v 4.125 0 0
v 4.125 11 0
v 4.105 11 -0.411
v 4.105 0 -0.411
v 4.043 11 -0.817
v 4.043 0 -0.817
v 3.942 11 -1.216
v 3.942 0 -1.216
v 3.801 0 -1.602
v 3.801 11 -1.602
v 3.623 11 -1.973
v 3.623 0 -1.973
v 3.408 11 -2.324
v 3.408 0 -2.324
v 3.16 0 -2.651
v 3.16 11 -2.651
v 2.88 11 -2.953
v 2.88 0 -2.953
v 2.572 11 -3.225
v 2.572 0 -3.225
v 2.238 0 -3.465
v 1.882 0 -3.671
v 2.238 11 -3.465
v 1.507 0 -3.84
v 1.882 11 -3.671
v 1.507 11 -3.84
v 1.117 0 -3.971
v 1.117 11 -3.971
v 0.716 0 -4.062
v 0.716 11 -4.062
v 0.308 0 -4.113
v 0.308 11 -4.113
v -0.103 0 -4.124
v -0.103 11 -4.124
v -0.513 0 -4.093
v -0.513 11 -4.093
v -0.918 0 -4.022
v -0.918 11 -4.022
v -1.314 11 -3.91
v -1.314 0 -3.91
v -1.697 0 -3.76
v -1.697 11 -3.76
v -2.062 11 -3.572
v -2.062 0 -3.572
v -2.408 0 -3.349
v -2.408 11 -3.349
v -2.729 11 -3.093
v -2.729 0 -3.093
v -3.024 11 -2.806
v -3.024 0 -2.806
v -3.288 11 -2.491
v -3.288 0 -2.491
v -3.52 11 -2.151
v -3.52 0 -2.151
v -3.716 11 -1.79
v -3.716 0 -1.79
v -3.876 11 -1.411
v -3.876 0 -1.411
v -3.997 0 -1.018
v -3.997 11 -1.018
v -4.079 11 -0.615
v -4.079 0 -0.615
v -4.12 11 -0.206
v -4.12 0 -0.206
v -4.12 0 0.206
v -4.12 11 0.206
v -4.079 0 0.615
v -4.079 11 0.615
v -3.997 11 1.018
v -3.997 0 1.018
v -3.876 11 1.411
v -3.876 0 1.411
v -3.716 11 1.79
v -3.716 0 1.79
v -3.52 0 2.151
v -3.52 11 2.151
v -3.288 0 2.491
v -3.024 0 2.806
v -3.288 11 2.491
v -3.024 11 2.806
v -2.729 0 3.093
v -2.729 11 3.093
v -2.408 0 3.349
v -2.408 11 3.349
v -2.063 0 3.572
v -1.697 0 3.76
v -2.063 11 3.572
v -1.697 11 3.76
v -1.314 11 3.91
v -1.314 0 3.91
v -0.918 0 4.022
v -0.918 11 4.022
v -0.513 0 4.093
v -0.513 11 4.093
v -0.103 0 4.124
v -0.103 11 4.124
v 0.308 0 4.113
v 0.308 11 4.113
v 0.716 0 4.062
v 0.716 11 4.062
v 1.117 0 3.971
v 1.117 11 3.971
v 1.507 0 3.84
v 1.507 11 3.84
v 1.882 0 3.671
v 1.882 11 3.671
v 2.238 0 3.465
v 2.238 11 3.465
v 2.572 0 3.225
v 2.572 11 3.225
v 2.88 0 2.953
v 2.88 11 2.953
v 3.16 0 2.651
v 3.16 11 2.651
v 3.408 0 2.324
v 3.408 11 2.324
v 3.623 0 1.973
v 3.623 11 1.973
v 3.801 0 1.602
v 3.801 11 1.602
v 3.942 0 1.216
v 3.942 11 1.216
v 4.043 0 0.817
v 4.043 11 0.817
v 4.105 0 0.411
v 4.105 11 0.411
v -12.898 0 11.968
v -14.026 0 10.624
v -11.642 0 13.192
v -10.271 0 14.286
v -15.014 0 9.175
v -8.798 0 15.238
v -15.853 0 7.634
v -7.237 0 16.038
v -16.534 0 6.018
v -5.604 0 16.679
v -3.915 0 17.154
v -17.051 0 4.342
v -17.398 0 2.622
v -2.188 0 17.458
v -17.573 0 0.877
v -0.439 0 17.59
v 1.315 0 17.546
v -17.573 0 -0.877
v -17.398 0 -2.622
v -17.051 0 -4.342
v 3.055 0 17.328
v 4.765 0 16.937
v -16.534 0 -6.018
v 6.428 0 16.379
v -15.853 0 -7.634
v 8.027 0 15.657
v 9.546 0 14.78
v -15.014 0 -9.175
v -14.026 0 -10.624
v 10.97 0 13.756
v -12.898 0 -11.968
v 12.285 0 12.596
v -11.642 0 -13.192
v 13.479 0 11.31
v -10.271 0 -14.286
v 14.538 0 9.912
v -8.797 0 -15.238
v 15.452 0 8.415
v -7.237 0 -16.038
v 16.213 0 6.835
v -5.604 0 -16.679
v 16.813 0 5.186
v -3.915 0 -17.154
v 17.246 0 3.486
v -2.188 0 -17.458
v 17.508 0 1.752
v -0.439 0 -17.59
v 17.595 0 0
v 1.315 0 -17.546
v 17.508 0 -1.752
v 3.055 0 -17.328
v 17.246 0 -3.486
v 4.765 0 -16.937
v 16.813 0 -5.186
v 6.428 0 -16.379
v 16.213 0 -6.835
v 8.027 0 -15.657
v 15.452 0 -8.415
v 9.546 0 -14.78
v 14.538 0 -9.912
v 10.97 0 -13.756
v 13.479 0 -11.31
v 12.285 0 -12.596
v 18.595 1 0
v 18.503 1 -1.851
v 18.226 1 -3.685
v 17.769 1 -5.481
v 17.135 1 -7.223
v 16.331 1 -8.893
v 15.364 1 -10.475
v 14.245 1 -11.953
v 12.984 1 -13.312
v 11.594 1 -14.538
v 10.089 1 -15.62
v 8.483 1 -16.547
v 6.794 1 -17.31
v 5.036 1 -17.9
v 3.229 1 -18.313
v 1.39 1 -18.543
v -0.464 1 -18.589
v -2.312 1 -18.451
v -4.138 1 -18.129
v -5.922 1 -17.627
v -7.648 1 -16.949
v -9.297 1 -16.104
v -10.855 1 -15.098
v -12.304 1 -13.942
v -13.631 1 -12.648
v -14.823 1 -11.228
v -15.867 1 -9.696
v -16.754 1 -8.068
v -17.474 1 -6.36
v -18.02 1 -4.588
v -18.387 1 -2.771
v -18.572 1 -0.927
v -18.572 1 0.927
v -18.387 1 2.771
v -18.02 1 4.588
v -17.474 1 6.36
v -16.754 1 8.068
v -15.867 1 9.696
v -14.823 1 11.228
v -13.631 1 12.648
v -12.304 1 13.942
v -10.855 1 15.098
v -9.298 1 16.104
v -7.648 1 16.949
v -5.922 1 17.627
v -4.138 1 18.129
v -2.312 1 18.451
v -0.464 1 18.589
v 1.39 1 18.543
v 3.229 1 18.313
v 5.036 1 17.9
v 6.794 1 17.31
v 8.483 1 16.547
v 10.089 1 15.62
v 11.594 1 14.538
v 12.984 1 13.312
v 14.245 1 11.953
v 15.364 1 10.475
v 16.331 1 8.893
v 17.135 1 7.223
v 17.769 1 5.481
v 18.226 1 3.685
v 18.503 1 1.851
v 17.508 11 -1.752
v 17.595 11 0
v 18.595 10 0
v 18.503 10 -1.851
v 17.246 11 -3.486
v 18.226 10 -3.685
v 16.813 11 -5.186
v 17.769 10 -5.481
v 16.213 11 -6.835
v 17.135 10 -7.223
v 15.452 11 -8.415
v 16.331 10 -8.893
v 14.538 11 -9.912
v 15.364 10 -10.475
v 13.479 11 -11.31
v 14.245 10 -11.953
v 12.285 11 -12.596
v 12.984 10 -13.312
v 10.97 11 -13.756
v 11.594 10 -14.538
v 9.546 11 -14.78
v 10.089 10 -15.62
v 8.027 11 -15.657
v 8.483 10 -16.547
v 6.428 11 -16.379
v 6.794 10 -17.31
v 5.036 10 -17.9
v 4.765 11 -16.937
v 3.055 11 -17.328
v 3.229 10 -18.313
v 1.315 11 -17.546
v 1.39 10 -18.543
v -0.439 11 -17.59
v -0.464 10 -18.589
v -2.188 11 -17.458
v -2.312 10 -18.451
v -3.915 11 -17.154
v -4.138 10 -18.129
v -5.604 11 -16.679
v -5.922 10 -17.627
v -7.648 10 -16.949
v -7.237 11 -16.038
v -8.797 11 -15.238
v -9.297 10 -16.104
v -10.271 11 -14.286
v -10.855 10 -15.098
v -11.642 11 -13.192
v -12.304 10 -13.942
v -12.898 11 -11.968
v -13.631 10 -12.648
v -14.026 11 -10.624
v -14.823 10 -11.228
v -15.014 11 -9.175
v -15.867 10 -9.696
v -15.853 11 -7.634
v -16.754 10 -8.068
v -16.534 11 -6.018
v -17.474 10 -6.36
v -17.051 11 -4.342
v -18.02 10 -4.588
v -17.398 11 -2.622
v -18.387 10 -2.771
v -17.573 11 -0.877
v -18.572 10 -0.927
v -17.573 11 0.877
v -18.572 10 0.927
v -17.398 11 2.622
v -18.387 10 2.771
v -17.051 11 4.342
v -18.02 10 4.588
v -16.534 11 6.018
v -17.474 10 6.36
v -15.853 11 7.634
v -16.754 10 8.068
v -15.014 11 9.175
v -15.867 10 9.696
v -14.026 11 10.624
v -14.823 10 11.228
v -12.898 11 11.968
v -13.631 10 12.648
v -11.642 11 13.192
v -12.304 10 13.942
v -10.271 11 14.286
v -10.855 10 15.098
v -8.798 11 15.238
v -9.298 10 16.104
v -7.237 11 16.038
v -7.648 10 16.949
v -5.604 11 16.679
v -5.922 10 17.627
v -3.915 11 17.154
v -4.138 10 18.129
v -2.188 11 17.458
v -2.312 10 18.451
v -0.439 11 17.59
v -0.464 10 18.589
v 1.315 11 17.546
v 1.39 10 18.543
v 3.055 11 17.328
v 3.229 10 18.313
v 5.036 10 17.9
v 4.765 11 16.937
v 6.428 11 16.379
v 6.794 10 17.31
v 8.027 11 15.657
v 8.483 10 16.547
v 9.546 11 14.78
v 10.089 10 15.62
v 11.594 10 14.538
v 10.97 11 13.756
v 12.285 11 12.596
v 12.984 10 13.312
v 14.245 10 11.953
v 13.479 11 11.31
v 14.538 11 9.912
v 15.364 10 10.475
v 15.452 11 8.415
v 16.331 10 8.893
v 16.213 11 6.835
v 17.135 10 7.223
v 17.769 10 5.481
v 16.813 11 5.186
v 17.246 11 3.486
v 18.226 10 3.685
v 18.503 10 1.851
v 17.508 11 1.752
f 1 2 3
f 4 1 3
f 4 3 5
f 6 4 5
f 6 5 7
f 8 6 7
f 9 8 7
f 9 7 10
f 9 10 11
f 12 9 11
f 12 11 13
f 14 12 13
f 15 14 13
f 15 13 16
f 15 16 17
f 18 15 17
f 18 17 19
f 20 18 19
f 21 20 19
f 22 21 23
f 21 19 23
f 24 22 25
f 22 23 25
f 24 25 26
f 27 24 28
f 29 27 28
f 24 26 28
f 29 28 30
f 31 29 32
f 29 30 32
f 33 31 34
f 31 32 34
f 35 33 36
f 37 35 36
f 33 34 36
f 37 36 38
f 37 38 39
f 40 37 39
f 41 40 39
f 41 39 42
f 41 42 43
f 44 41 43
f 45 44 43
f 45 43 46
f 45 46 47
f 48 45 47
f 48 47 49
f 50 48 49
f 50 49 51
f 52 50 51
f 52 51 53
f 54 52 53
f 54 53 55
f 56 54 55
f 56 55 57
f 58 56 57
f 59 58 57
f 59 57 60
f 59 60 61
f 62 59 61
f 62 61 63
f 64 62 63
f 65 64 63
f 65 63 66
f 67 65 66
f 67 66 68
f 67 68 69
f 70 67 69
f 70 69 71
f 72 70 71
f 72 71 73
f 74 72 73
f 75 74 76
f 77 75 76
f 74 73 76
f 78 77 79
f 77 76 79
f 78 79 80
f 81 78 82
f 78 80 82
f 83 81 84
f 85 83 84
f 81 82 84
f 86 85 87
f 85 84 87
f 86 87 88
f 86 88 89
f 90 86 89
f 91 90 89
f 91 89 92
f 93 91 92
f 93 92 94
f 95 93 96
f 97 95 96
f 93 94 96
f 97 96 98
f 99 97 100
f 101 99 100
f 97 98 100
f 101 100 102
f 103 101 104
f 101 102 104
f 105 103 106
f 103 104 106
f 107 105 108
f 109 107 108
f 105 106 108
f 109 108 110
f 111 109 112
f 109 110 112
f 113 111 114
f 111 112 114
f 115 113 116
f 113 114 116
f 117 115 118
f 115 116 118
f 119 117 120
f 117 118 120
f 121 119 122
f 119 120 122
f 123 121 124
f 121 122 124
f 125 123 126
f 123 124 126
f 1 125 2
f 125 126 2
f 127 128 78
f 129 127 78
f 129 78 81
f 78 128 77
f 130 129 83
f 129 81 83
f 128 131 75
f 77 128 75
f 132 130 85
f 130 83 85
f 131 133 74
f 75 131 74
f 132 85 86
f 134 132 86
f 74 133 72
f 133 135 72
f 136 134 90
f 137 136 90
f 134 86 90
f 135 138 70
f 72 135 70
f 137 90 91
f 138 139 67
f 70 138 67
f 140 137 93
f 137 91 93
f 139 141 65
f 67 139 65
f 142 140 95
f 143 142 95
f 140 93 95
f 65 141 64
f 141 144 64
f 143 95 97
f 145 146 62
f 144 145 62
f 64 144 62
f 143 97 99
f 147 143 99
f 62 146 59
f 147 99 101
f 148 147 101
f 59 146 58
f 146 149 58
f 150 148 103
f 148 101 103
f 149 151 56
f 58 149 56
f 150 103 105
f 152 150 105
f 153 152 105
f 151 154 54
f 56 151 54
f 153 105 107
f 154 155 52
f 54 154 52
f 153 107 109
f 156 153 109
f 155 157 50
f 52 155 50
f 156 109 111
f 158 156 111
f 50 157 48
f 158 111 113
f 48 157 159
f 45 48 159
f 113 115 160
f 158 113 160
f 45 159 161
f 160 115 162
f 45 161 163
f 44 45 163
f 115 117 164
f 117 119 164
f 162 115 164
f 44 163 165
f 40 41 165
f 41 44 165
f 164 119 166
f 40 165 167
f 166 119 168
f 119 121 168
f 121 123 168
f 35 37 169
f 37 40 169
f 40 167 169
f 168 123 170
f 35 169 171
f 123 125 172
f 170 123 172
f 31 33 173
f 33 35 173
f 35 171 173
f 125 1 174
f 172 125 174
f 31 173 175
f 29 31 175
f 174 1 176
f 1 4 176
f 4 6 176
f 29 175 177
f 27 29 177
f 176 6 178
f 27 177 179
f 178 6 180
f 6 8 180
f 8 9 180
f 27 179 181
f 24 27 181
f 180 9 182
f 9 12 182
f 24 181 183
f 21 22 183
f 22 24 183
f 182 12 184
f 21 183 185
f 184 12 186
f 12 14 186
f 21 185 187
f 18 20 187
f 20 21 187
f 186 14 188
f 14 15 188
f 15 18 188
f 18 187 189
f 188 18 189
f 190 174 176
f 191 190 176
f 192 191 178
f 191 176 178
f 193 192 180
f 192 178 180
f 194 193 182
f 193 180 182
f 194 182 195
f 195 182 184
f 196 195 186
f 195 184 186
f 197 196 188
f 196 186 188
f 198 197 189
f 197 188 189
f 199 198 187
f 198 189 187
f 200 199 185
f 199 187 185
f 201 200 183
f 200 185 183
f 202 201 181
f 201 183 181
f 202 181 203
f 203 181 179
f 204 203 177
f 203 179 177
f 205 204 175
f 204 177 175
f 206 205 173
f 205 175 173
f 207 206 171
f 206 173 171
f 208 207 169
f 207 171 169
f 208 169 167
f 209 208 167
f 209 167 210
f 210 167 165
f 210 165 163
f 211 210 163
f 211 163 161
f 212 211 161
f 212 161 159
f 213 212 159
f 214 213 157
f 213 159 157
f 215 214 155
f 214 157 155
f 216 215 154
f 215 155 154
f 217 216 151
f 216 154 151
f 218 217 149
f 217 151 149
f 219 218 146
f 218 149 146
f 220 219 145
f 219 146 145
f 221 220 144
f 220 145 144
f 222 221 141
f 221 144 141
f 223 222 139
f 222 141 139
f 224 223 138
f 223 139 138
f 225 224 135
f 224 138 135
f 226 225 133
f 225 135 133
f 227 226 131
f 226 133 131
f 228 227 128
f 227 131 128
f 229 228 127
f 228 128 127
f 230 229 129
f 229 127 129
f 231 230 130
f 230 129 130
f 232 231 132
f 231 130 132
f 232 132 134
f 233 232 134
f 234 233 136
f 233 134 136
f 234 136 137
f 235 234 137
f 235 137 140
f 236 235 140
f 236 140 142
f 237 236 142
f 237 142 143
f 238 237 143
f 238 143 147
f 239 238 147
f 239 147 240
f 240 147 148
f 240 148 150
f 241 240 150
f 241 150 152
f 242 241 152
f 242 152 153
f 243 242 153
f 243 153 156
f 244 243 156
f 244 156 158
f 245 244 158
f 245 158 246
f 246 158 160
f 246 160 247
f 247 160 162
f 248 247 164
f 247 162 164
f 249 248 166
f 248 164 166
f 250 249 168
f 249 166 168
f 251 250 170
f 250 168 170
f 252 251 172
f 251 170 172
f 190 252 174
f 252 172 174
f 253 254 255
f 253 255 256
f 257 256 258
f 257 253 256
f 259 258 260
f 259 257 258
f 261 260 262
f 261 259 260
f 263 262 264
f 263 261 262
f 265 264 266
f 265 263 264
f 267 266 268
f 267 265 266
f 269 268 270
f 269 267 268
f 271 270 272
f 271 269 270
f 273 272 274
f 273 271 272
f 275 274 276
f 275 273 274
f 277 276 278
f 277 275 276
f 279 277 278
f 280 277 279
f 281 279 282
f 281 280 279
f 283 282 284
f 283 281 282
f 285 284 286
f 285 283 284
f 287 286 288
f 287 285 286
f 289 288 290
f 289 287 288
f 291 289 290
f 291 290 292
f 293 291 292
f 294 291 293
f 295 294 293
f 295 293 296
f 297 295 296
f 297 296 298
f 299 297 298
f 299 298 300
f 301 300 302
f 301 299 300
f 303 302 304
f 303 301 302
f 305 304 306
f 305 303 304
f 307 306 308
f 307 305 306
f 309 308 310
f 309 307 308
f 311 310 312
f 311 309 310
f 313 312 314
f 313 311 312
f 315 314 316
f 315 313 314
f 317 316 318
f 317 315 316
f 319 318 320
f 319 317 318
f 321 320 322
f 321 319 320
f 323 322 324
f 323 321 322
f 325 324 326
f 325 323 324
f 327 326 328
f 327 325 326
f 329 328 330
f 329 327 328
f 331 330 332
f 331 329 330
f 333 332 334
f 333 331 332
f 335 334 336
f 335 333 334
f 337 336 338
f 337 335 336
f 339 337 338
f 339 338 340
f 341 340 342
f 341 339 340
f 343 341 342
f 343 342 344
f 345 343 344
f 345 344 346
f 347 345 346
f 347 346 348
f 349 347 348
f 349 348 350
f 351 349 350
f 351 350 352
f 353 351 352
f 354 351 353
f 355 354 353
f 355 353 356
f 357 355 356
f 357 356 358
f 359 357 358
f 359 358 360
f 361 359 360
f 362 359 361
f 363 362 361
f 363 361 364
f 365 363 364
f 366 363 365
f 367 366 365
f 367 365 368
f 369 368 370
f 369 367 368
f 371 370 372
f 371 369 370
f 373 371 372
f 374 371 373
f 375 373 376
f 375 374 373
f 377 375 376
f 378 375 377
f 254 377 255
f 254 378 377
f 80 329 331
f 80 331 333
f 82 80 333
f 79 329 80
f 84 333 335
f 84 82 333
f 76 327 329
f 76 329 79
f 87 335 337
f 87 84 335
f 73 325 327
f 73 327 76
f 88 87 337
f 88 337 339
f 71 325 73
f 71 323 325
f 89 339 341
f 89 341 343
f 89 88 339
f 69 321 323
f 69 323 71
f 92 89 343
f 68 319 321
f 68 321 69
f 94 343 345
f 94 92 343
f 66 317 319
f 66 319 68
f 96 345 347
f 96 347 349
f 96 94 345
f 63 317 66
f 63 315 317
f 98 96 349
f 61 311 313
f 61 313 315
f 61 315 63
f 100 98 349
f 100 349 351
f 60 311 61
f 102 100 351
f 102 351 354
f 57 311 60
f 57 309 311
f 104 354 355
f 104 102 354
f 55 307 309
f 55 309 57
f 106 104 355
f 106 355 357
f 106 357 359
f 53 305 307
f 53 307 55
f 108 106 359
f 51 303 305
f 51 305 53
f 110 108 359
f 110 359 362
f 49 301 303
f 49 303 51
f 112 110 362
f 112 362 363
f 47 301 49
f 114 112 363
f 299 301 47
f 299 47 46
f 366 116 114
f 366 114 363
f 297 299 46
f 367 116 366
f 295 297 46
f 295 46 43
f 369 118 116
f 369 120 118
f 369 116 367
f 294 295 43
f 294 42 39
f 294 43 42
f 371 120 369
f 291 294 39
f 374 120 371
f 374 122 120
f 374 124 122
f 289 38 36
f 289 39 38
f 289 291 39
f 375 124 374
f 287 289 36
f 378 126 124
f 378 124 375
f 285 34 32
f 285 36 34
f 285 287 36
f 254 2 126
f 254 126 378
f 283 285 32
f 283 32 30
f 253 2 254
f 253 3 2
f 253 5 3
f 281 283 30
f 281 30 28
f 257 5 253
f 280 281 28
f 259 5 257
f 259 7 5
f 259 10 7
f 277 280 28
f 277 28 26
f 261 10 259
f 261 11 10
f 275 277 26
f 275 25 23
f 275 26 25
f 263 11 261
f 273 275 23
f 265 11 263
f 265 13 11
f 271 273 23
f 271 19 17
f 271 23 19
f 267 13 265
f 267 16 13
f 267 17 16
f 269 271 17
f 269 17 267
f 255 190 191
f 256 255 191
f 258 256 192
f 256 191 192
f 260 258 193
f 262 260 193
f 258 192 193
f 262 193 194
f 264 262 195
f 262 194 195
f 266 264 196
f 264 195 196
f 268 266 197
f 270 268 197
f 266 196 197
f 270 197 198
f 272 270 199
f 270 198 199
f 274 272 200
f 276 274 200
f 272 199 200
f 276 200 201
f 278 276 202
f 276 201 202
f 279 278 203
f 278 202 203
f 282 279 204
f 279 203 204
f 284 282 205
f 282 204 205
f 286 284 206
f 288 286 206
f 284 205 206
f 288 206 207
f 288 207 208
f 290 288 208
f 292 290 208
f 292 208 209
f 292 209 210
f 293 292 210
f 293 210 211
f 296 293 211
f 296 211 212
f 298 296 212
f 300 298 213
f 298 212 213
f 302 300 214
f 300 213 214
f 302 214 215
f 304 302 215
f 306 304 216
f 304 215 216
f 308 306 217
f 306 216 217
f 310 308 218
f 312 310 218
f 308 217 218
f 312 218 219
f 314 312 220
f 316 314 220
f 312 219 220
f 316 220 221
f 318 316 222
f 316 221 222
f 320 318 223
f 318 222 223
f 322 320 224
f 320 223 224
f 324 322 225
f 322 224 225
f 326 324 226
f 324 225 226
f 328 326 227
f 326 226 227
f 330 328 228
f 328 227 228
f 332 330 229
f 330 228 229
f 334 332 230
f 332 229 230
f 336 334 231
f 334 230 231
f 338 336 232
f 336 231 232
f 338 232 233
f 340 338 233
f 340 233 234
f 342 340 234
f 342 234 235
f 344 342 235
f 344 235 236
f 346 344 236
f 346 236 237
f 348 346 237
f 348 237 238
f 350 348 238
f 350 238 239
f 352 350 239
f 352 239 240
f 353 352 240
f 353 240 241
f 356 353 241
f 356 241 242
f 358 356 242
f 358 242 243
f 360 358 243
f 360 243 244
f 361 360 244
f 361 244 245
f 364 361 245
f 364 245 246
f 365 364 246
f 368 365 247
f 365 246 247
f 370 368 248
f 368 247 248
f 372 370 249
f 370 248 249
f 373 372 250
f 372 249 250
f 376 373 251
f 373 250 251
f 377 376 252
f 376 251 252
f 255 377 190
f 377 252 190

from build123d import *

# Parameters (mm, degrees)
SKETCH1_R           = 18.595
BOSS_EXTRUDE1_DEPTH = 11
SKETCH2_R           = 4.125
CUT_EXTRUDE1_DEPTH  = 12
CHAMFER1_SIZE       = 1


with BuildPart() as part:
    # Sketch1 → Boss-Extrude1 (new body)
    with BuildSketch(Plane(origin=(0, 0, 0), x_dir=(1, 0, 0), z_dir=(0, 1, 0))):
        Circle(SKETCH1_R)
    extrude(amount=BOSS_EXTRUDE1_DEPTH)

    # Sketch2 → Cut-Extrude1 (cut, through all)
    with BuildSketch(Plane(origin=(0, 11, 0), x_dir=(1, 0, 0), z_dir=(0, 1, 0))):
        Circle(SKETCH2_R)
    extrude(amount=-CUT_EXTRUDE1_DEPTH, mode=Mode.SUBTRACT)

    # Chamfer1
    chamfer1_edges = [part.edges().sort_by_distance(p)[0] for p in [
        (-18.595, 0, 0),
        (-18.595, 11, 0),
    ]]
    chamfer(chamfer1_edges, length=CHAMFER1_SIZE)


solid = part.part
